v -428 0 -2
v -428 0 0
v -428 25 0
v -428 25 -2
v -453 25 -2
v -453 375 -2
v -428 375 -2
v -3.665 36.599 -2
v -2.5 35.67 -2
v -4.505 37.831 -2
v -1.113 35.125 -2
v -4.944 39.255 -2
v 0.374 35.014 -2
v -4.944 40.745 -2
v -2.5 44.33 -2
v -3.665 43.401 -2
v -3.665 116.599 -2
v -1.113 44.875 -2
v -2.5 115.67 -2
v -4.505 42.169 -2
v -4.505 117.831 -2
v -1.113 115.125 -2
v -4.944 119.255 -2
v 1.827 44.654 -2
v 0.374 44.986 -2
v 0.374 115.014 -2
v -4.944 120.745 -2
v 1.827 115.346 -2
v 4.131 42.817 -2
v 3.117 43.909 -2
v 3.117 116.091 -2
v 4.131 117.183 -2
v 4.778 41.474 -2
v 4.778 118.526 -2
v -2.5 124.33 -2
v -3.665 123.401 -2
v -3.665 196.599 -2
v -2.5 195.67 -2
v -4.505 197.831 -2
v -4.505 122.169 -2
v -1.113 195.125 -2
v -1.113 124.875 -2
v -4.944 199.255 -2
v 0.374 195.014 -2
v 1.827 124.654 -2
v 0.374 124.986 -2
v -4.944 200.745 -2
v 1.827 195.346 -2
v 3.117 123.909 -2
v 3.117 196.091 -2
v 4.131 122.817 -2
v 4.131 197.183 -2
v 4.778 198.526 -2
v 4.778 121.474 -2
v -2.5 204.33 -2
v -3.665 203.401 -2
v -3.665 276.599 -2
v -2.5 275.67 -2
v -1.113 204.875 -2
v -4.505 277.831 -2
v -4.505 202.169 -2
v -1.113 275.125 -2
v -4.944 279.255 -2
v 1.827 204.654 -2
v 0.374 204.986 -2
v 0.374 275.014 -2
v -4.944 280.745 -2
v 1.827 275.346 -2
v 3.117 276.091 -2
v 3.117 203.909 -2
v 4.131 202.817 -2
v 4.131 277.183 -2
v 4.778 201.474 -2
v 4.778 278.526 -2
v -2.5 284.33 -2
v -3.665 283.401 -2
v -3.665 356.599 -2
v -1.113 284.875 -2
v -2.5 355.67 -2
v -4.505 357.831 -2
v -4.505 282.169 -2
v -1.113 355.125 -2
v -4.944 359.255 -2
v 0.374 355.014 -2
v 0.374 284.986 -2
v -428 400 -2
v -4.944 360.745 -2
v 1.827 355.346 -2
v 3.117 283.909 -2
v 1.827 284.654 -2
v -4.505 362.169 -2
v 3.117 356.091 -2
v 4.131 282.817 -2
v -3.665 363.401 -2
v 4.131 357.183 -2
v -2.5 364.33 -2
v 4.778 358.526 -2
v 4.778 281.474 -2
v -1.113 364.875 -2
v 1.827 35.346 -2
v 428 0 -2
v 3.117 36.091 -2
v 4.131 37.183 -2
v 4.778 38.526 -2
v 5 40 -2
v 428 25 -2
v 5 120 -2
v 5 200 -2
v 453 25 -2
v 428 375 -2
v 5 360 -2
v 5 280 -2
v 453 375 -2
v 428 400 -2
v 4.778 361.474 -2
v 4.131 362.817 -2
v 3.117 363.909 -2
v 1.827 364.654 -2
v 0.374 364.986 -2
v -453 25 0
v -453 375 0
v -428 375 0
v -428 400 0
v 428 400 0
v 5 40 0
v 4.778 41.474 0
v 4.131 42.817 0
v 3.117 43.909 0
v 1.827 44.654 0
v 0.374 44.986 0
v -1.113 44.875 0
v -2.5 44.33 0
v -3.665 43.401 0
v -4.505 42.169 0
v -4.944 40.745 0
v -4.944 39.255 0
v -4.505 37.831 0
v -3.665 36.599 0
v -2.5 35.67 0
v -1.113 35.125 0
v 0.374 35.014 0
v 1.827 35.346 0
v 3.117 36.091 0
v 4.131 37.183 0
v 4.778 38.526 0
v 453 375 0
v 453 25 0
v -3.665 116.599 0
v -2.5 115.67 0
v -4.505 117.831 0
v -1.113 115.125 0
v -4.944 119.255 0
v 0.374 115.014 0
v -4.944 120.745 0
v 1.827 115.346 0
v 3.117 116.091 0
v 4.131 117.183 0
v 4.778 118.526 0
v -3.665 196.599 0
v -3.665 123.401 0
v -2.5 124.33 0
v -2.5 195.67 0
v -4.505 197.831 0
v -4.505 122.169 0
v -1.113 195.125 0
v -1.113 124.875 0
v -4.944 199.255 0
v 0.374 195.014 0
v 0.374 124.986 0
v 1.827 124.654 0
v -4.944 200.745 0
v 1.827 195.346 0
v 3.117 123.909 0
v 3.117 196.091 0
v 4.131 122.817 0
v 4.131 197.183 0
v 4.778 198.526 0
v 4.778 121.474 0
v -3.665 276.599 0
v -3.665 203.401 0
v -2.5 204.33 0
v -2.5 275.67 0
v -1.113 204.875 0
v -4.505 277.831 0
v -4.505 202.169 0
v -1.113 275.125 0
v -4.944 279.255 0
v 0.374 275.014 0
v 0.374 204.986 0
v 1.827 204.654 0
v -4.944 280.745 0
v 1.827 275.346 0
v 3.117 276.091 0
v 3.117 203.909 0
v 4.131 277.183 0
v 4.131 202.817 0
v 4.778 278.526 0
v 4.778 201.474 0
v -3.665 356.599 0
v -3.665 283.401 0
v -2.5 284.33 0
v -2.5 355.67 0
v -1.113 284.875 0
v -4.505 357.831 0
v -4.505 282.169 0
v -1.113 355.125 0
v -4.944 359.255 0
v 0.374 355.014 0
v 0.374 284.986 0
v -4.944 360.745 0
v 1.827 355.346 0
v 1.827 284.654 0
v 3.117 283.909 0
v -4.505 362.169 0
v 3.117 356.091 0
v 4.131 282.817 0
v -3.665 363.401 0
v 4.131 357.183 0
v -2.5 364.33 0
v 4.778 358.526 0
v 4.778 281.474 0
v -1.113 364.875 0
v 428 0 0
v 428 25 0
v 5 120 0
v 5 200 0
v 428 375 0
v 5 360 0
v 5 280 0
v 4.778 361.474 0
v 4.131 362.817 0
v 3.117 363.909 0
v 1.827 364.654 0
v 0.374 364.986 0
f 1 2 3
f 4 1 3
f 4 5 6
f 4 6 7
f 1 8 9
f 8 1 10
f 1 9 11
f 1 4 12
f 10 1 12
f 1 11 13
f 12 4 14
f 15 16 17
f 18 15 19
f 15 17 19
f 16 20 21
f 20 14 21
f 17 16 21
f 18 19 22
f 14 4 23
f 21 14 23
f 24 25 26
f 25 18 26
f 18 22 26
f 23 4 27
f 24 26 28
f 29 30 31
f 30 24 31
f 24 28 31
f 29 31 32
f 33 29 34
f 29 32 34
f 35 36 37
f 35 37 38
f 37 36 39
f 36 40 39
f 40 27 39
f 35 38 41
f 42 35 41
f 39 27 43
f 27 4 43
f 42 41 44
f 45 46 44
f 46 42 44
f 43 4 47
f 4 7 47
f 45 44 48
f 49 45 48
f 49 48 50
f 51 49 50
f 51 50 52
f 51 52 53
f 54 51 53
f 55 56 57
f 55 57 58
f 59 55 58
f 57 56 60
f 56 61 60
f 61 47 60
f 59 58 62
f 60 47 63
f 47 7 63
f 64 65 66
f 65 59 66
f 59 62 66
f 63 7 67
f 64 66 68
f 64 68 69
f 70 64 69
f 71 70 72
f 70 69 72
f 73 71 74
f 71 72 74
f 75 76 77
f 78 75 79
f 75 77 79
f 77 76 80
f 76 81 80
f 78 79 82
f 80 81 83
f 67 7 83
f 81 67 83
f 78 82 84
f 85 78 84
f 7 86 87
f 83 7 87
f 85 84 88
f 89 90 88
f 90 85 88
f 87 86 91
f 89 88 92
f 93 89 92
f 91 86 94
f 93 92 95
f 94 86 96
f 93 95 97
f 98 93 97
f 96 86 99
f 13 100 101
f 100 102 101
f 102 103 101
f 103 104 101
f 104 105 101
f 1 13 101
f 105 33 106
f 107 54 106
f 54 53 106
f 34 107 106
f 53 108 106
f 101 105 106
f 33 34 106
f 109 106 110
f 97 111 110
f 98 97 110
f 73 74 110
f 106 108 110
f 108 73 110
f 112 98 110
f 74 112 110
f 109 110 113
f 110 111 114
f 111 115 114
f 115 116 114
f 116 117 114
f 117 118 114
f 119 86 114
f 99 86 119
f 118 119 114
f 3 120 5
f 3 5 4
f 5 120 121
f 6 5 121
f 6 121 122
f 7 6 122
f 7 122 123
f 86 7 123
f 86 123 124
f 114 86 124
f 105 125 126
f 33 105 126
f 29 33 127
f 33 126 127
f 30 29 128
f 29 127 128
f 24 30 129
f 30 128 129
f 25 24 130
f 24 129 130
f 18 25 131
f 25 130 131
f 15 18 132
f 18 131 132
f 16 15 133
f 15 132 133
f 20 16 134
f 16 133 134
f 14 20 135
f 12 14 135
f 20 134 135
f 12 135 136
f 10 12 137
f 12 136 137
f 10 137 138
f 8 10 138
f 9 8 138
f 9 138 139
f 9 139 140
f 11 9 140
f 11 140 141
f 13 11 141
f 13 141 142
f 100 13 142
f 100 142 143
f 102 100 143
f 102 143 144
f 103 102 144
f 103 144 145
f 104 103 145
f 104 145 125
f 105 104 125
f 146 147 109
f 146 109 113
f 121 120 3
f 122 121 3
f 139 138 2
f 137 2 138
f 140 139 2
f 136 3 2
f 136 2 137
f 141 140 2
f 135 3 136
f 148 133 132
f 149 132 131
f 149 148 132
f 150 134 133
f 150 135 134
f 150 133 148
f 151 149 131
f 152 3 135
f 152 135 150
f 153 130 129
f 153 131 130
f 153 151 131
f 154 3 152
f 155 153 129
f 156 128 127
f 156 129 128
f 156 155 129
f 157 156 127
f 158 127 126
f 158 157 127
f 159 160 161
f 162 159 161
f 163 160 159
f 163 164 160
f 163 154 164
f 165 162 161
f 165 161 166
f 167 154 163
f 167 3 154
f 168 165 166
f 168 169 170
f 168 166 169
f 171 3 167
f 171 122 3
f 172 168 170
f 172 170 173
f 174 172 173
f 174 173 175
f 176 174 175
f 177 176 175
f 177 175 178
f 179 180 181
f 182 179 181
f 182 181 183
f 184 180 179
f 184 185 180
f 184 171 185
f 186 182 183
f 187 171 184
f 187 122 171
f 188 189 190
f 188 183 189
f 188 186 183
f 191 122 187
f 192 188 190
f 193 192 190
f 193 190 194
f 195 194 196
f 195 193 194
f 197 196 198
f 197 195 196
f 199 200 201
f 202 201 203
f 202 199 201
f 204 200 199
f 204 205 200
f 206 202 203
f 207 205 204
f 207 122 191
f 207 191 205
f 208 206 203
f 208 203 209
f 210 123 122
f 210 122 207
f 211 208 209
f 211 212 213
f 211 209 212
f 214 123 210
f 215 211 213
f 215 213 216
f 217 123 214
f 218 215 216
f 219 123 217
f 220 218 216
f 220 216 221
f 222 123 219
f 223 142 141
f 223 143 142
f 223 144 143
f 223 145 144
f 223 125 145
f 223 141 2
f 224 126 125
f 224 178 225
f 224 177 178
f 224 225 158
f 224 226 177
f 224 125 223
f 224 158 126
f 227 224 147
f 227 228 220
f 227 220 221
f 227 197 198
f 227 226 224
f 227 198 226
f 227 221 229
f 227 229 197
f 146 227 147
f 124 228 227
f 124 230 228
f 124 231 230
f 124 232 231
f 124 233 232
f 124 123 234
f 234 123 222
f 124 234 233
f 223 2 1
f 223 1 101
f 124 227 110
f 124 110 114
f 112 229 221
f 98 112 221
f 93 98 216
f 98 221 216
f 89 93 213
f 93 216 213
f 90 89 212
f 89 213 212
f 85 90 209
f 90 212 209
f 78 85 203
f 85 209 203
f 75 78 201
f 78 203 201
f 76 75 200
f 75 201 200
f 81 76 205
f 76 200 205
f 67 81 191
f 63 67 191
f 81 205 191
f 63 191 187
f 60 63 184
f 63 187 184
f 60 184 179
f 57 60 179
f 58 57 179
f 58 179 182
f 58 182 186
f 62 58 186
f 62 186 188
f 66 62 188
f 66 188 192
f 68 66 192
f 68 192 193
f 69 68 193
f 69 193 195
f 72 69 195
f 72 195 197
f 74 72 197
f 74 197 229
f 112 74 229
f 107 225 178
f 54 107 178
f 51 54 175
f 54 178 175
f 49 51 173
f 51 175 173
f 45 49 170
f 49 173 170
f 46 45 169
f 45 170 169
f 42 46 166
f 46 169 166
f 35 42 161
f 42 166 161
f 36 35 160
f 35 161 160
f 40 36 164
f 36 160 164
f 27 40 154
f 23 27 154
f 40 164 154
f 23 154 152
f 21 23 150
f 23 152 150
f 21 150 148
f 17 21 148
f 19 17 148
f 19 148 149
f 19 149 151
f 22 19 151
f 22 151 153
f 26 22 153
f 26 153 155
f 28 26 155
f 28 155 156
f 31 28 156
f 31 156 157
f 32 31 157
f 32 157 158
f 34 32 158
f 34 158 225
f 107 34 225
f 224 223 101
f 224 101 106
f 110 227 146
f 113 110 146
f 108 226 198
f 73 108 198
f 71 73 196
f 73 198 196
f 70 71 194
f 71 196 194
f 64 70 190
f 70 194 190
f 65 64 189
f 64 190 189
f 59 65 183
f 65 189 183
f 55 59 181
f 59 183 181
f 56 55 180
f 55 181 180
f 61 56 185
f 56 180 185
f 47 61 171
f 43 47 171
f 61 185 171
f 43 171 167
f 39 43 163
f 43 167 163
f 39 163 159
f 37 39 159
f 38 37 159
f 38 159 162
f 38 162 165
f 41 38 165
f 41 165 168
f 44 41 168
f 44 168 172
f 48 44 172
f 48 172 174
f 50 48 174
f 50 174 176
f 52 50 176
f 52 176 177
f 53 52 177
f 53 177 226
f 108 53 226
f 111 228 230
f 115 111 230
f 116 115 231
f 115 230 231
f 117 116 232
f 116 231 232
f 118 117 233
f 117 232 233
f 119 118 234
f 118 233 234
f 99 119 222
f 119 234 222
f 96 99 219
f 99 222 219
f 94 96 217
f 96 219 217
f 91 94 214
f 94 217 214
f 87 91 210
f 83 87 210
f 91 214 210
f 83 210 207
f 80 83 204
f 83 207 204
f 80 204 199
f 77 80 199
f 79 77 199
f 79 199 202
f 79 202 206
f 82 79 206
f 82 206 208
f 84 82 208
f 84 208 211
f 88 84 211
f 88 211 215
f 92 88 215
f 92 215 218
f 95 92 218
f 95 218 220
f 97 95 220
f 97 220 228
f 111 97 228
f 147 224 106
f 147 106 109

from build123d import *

# Parameters (mm, degrees)
IZIM1_W               = 906
IZIM1_H               = 400
TABAN_FLAN_1_DEPTH    = 2
IZIM6_W               = 25
IZIM6_H               = 25
KES_EKSTR_ZYON1_DEPTH = 10
IZIM7_R               = 5
KES_EKSTR_ZYON2_DEPTH = 10


# Sheet-metal steps are written as plain solids
with BuildPart() as part:
    # Çizim1 → Taban-Flanş1 (new body)
    with BuildSketch(Plane.XY):
        with Locations((0, 200)):
            Rectangle(IZIM1_W, IZIM1_H)
    extrude(amount=-TABAN_FLAN_1_DEPTH)

    # Çizim6 → Kes-Ekstrüzyon1 (cut)
    with BuildSketch(Plane.XY):
        with Locations((-440.5, 387.5)):
            Rectangle(IZIM6_W, IZIM6_H)
        with Locations((440.5, 387.5)):
            Rectangle(IZIM6_W, IZIM6_H)
        with Locations((440.5, 12.5)):
            Rectangle(IZIM6_W, IZIM6_H)
        with Locations((-440.5, 12.5)):
            Rectangle(IZIM6_W, IZIM6_H)
    extrude(amount=-KES_EKSTR_ZYON1_DEPTH, mode=Mode.SUBTRACT)

    # Çizim7 → Kes-Ekstrüzyon2 (cut)
    with BuildSketch(Plane.XY):
        with Locations((0, 360)):
            Circle(IZIM7_R)
        with Locations((0, 280)):
            Circle(IZIM7_R)
        with Locations((0, 200)):
            Circle(IZIM7_R)
        with Locations((0, 120)):
            Circle(IZIM7_R)
        with Locations((0, 40)):
            Circle(IZIM7_R)
    extrude(amount=-KES_EKSTR_ZYON2_DEPTH, mode=Mode.SUBTRACT)


solid = part.part
